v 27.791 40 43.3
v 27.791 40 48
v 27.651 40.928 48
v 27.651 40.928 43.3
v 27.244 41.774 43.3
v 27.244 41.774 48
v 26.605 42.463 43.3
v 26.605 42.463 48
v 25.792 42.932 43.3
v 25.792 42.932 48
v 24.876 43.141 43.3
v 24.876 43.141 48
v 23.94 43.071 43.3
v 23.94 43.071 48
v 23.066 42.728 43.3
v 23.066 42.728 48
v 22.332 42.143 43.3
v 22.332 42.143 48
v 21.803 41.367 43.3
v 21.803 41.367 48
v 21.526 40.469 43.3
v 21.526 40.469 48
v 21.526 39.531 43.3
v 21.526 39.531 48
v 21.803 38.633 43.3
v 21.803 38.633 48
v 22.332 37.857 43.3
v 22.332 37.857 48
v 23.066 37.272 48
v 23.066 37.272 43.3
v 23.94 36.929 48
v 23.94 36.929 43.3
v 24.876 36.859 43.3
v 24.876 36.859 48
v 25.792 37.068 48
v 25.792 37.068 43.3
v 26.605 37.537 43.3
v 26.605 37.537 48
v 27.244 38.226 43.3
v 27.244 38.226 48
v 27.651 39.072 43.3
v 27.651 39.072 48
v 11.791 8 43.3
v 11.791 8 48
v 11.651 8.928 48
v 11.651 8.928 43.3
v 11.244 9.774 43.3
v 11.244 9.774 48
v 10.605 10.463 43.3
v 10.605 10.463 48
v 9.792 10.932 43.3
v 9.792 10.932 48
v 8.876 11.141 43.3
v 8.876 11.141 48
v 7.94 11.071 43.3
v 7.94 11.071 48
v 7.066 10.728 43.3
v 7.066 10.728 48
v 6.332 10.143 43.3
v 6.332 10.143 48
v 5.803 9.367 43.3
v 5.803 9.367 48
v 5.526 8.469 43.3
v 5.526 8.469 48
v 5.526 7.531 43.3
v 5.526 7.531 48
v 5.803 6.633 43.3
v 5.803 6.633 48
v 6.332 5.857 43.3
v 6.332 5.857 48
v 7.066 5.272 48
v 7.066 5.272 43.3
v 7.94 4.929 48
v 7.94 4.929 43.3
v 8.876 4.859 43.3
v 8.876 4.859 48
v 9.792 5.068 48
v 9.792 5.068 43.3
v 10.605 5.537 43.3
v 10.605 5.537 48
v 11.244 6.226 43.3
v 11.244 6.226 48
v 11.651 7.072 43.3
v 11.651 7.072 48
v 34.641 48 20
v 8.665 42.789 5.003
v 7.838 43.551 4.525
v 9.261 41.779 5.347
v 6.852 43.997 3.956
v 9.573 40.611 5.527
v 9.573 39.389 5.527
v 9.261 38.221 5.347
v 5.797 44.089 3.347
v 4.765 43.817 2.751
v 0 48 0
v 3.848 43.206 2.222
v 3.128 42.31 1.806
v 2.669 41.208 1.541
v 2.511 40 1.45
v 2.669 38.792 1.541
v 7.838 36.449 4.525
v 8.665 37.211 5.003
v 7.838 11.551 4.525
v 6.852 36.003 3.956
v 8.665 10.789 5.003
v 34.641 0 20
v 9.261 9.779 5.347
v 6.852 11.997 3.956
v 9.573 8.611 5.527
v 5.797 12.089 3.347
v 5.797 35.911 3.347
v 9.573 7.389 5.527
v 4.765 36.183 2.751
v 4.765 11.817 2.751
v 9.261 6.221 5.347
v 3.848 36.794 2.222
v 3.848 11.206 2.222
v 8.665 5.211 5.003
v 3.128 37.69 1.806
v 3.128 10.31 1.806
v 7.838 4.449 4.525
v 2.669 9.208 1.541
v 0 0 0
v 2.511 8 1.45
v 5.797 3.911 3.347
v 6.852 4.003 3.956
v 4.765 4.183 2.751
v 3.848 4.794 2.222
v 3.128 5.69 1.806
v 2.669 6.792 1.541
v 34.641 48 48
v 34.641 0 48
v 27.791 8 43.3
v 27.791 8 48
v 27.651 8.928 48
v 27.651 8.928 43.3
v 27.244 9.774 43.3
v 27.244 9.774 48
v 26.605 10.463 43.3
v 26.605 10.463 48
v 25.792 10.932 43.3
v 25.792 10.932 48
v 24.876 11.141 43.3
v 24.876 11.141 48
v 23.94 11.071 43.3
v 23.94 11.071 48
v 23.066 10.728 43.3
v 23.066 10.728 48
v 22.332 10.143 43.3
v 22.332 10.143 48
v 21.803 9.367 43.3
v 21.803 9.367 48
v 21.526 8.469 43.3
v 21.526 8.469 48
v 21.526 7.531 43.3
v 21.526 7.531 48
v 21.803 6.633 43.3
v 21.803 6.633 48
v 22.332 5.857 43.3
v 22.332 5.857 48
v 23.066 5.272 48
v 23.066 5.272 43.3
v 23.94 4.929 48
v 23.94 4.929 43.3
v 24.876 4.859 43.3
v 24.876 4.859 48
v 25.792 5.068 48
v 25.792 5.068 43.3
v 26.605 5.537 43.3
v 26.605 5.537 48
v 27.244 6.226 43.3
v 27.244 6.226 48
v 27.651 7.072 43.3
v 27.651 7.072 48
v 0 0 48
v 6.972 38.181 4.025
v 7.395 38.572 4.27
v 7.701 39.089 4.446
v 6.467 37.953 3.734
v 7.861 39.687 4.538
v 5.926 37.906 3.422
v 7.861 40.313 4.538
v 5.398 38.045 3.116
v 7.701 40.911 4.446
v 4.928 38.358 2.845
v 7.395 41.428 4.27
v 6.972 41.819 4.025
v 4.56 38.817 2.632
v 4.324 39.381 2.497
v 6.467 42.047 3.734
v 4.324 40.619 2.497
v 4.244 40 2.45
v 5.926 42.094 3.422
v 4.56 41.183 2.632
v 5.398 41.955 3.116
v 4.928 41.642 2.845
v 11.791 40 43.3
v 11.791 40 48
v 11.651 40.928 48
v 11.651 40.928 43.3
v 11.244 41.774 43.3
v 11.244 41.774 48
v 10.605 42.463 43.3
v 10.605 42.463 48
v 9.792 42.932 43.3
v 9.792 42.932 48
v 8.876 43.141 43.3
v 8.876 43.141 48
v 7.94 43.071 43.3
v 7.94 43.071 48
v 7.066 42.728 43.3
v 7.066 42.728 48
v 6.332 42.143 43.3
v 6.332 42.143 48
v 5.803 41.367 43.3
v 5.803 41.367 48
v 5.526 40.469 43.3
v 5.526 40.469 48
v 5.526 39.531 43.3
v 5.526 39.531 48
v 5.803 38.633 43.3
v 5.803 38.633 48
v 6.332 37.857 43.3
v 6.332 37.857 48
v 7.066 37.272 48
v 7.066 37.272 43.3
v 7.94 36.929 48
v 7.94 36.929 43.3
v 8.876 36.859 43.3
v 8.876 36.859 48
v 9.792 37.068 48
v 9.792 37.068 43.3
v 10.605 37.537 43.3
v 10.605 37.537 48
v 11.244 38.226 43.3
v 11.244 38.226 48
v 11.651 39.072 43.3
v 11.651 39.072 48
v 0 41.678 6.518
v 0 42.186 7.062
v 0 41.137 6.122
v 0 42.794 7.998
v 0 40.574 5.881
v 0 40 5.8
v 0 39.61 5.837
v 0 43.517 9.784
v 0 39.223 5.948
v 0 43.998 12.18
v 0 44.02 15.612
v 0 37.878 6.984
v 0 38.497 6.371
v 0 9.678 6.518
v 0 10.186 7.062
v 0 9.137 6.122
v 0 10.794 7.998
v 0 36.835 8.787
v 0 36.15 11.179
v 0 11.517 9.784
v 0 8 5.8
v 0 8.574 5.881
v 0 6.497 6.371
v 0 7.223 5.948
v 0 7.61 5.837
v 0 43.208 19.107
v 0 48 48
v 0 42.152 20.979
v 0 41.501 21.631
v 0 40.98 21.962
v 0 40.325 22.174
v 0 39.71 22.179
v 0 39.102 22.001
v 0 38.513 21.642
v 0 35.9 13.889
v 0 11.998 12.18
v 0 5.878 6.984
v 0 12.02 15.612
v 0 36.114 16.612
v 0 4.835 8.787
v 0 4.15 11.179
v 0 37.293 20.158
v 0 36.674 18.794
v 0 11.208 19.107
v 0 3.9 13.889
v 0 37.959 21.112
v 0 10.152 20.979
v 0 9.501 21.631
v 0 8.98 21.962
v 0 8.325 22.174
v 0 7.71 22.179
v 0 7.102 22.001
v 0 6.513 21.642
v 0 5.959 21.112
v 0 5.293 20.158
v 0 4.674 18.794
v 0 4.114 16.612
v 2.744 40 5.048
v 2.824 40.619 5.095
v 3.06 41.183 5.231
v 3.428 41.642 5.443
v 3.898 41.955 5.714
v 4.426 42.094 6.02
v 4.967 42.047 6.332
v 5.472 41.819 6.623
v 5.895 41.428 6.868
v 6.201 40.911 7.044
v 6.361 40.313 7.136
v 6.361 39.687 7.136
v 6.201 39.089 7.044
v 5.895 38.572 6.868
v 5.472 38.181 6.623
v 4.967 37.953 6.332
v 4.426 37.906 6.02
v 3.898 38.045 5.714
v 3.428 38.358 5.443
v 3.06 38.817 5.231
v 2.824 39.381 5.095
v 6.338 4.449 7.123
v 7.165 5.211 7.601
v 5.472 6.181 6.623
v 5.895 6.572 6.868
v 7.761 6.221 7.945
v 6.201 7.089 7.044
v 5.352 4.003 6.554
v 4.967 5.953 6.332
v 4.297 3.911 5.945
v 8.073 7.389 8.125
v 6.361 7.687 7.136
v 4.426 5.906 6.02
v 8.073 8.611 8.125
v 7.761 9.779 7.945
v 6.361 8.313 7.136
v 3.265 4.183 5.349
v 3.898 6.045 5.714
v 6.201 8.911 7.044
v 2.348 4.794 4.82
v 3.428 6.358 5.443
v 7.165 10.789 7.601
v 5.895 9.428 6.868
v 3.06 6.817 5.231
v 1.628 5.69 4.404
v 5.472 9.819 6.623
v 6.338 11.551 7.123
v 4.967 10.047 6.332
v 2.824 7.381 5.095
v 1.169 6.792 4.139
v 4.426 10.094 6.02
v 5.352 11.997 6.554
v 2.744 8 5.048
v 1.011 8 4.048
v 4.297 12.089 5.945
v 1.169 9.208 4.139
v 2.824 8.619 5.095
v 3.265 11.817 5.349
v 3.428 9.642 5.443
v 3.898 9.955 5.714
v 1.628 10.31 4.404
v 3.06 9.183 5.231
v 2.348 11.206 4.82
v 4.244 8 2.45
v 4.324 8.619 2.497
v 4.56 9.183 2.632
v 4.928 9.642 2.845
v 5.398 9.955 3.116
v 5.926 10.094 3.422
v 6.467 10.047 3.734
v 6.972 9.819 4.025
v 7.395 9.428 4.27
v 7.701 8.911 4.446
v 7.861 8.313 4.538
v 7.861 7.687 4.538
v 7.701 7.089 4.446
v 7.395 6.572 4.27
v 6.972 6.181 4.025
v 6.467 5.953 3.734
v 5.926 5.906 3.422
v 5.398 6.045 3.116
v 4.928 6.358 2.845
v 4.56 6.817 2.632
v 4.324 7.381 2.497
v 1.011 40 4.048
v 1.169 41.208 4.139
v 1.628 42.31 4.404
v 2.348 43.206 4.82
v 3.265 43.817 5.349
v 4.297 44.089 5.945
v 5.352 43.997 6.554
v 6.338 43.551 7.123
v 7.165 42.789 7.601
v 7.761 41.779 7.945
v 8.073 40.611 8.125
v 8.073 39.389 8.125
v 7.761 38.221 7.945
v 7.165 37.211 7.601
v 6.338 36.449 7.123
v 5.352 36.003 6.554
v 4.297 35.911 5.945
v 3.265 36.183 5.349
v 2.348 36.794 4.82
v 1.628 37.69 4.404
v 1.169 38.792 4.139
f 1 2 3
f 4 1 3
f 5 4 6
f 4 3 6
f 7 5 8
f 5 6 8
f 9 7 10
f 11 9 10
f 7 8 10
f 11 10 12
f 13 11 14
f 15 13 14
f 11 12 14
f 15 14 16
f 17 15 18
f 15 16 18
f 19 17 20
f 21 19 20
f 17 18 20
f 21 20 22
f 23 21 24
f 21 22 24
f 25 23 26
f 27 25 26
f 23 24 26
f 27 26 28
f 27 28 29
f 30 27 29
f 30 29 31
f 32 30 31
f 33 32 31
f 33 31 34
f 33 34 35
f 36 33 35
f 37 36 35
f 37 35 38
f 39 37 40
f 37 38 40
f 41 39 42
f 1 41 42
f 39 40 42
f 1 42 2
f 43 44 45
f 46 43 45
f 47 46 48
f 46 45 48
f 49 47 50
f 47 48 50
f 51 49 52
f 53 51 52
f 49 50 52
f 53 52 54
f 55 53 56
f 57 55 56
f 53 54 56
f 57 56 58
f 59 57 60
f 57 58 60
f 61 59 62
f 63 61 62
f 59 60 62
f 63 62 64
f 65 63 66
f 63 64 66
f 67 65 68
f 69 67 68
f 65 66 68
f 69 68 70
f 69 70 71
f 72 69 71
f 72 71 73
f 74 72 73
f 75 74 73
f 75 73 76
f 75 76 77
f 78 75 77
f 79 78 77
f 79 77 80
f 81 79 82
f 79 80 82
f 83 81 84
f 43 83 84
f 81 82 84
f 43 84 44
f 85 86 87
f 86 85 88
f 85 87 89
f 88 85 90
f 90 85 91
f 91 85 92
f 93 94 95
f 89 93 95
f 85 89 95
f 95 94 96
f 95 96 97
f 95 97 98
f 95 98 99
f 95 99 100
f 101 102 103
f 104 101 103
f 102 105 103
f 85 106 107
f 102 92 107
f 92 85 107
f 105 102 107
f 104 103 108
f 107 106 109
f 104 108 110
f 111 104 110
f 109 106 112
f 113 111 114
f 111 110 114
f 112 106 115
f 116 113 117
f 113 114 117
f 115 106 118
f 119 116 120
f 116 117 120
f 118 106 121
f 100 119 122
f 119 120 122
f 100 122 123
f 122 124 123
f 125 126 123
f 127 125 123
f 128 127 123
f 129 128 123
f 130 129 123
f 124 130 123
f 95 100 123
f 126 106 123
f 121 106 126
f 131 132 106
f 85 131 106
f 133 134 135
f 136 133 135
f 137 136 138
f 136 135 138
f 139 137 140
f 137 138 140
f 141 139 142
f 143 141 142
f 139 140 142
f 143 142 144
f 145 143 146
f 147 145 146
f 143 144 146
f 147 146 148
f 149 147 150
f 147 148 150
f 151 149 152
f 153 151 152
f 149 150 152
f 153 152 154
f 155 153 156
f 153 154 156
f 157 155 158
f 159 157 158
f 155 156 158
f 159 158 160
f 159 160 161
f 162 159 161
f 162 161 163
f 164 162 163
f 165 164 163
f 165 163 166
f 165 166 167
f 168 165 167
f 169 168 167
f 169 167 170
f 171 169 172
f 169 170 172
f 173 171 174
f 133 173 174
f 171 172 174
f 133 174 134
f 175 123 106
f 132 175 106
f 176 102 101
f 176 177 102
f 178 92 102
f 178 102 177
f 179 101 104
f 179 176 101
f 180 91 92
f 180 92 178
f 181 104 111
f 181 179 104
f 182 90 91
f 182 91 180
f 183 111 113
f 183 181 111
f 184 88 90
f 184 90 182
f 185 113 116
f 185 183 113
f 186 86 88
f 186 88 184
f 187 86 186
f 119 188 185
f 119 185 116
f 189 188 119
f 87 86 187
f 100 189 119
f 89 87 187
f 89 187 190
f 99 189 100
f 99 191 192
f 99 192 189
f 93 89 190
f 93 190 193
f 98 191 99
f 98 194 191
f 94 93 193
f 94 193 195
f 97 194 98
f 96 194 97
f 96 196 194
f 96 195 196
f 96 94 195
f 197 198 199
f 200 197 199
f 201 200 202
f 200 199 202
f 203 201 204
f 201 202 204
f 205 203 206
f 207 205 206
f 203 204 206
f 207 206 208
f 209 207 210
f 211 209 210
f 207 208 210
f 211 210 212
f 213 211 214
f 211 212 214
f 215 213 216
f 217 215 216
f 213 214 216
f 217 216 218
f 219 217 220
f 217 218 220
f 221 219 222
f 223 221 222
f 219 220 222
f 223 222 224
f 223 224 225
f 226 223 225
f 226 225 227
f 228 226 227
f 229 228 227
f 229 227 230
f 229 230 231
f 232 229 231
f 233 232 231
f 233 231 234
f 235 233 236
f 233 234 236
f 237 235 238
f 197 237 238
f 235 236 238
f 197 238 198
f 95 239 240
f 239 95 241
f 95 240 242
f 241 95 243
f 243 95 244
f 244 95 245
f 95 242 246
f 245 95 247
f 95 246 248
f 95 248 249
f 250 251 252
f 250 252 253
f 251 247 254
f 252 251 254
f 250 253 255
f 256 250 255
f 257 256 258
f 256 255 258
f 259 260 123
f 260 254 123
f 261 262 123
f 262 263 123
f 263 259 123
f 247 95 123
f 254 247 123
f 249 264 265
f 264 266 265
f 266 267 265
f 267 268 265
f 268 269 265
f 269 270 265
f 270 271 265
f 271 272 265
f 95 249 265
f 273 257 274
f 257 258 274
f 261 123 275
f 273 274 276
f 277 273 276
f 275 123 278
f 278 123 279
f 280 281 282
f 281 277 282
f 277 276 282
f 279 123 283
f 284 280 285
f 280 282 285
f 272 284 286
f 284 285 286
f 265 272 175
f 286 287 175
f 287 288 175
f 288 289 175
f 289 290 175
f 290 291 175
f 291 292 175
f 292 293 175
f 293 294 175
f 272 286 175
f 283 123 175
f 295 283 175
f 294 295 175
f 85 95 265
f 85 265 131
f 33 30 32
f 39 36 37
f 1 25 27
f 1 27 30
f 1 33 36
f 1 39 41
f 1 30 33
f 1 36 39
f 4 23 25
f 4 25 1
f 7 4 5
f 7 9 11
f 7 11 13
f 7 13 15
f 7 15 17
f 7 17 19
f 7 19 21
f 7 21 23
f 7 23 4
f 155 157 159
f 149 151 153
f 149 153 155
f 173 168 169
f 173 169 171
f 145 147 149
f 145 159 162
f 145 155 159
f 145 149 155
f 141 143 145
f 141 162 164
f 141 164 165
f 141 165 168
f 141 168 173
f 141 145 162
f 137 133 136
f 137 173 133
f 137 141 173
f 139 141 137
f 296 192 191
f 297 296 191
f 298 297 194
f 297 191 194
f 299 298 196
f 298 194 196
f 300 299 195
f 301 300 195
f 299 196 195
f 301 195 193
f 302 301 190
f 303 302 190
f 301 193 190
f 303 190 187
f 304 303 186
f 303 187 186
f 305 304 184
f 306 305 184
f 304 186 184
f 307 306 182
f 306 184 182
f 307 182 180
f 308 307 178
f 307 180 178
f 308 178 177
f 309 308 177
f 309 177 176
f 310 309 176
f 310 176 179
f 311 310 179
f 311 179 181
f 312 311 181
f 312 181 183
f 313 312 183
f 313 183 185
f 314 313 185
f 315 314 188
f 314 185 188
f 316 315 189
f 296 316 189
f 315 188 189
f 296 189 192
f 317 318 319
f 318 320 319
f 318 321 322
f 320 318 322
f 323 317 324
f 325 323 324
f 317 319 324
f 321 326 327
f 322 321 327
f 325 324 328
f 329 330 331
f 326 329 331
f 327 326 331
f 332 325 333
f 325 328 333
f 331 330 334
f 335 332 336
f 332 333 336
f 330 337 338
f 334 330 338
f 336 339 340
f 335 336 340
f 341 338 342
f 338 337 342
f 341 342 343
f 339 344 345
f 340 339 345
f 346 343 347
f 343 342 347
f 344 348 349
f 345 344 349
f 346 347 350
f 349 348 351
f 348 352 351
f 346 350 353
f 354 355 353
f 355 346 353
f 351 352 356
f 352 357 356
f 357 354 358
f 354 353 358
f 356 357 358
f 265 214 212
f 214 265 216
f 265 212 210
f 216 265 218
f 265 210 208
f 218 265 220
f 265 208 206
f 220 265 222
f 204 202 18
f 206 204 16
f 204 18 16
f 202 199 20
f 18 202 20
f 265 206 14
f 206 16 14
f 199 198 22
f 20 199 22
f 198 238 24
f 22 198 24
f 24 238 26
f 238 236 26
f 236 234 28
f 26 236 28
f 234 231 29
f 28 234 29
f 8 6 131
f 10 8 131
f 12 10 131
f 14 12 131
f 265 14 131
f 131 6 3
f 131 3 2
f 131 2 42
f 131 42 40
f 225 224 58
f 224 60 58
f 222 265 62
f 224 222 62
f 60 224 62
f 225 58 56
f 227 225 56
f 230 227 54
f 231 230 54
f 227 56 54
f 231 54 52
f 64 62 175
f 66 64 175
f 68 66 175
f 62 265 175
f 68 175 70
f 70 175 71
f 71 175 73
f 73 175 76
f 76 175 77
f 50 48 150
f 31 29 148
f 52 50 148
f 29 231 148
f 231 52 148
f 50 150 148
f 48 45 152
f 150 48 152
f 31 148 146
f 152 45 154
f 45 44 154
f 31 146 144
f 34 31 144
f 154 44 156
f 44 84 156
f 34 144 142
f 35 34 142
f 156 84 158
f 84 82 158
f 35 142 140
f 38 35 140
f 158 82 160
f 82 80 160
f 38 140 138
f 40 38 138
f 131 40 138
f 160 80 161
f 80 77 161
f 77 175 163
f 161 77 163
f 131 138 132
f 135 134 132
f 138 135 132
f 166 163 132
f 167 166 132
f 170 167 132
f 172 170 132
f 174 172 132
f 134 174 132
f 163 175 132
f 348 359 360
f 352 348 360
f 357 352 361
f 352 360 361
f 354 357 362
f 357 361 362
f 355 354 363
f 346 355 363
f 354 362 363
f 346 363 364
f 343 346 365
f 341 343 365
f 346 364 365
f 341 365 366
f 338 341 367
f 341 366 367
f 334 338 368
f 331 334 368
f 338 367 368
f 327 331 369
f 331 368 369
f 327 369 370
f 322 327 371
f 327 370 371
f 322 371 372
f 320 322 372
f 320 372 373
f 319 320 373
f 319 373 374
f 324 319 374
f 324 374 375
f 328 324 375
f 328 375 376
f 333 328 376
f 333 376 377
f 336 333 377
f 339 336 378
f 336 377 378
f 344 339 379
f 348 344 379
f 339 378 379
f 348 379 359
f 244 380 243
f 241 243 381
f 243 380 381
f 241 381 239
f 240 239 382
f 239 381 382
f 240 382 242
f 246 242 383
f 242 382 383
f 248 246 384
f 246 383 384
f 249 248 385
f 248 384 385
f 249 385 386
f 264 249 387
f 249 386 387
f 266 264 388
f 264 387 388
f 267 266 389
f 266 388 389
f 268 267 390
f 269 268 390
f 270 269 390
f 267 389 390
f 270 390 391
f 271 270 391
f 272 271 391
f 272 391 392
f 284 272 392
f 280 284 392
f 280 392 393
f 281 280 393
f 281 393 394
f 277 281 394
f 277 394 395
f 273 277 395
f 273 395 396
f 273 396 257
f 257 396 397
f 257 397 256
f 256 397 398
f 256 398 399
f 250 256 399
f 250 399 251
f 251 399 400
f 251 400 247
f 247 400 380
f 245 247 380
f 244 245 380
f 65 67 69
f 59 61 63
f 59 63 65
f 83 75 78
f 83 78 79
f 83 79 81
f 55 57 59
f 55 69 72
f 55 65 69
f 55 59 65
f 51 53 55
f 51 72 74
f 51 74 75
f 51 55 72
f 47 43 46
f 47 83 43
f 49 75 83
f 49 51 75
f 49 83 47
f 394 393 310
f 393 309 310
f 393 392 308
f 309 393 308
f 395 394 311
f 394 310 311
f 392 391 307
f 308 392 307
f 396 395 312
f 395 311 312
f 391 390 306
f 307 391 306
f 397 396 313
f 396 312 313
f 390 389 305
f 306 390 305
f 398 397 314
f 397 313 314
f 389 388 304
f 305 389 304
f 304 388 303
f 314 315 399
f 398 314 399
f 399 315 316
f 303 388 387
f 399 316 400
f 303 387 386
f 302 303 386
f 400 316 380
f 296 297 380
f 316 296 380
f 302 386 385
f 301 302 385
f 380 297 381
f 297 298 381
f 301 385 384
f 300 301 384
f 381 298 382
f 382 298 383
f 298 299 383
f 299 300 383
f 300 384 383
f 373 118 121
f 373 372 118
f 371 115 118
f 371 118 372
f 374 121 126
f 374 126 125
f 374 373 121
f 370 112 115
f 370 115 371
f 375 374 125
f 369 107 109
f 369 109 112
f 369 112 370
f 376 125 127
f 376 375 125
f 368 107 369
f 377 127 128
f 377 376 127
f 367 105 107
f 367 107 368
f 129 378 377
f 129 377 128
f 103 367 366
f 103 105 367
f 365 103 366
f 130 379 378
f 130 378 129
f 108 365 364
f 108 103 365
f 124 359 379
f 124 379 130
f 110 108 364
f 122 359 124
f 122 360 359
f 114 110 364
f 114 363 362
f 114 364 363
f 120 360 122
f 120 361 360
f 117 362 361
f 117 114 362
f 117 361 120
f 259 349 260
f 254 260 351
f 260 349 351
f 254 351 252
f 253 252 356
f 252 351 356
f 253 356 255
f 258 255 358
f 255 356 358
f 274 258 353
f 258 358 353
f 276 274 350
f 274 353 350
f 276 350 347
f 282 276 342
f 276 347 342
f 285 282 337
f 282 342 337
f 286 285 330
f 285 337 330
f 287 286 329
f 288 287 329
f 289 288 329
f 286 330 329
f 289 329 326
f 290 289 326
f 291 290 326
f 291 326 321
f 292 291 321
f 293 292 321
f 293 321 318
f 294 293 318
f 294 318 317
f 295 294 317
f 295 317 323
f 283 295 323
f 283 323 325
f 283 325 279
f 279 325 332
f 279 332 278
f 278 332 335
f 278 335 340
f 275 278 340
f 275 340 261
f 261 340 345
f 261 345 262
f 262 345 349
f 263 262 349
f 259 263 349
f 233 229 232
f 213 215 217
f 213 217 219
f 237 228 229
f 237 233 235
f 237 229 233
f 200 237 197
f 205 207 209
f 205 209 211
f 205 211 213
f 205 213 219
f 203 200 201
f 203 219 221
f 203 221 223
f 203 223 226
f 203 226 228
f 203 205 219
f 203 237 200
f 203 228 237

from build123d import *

# Parameters (mm, degrees)
BOSS_EXTRUDE1_DEPTH = 48
SKETCH3_R           = 4.1
CUT_EXTRUDE1_DEPTH  = 41.7
SKETCH4_R           = 3.15
CUT_EXTRUDE2_DEPTH  = 4.7
SKETCH5_R           = 4.1
SKETCH5_R_2         = 2.1
BOSS_EXTRUDE2_DEPTH = 3


with BuildPart() as part:
    # Sketch2 → Boss-Extrude1 (new body)
    with BuildSketch(Plane(origin=(0, 0, 0), x_dir=(1, 0, 0), z_dir=(0, 1, 0))):
        Polygon((0, 0), (0, -20), (0, -48), (34.641016151, -48), (34.641016151, -20), align=None)
    extrude(amount=BOSS_EXTRUDE1_DEPTH)

    # Sketch3 → Cut-Extrude1 (cut)
    with BuildSketch(Plane(origin=(0, 0, 0), x_dir=(-0.8660254037844417, 0, -0.4999999999999947), z_dir=(0.49999999999999484, 0, -0.8660254037844418))):
        with Locations((-7, 40)):
            Circle(SKETCH3_R)
        with Locations((-7, 8)):
            Circle(SKETCH3_R)
    extrude(amount=-CUT_EXTRUDE1_DEPTH, mode=Mode.SUBTRACT)

    # Sketch4 → Cut-Extrude2 (cut)
    with BuildSketch(Plane.XY.offset(48)):
        with Locations((8.641016151, 40)):
            Circle(SKETCH4_R)
        with Locations((24.641016151, 40)):
            Circle(SKETCH4_R)
        with Locations((8.641016151, 8)):
            Circle(SKETCH4_R)
        with Locations((24.641016151, 8)):
            Circle(SKETCH4_R)
    extrude(amount=-CUT_EXTRUDE2_DEPTH, mode=Mode.SUBTRACT)

    # Sketch5 → Boss-Extrude2 (add)
    # profile 1 of 2: a face of its own
    with BuildSketch(Plane(origin=(0, 0, 0), x_dir=(-0.8660254037844417, 0, -0.4999999999999947), z_dir=(0.49999999999999484, 0, -0.8660254037844418))):
        with Locations((-7, 40)):
            Circle(SKETCH5_R)
        with Locations((-7, 40)):
            Circle(SKETCH5_R_2, mode=Mode.SUBTRACT)
    # profile 2 of 2: a face of its own
    with BuildSketch(Plane(origin=(0, 0, 0), x_dir=(-0.8660254037844417, 0, -0.4999999999999947), z_dir=(0.49999999999999484, 0, -0.8660254037844418))):
        with Locations((-7, 8)):
            Circle(SKETCH5_R)
        with Locations((-7, 8)):
            Circle(SKETCH5_R_2, mode=Mode.SUBTRACT)
    extrude(amount=-BOSS_EXTRUDE2_DEPTH)


solid = part.part
